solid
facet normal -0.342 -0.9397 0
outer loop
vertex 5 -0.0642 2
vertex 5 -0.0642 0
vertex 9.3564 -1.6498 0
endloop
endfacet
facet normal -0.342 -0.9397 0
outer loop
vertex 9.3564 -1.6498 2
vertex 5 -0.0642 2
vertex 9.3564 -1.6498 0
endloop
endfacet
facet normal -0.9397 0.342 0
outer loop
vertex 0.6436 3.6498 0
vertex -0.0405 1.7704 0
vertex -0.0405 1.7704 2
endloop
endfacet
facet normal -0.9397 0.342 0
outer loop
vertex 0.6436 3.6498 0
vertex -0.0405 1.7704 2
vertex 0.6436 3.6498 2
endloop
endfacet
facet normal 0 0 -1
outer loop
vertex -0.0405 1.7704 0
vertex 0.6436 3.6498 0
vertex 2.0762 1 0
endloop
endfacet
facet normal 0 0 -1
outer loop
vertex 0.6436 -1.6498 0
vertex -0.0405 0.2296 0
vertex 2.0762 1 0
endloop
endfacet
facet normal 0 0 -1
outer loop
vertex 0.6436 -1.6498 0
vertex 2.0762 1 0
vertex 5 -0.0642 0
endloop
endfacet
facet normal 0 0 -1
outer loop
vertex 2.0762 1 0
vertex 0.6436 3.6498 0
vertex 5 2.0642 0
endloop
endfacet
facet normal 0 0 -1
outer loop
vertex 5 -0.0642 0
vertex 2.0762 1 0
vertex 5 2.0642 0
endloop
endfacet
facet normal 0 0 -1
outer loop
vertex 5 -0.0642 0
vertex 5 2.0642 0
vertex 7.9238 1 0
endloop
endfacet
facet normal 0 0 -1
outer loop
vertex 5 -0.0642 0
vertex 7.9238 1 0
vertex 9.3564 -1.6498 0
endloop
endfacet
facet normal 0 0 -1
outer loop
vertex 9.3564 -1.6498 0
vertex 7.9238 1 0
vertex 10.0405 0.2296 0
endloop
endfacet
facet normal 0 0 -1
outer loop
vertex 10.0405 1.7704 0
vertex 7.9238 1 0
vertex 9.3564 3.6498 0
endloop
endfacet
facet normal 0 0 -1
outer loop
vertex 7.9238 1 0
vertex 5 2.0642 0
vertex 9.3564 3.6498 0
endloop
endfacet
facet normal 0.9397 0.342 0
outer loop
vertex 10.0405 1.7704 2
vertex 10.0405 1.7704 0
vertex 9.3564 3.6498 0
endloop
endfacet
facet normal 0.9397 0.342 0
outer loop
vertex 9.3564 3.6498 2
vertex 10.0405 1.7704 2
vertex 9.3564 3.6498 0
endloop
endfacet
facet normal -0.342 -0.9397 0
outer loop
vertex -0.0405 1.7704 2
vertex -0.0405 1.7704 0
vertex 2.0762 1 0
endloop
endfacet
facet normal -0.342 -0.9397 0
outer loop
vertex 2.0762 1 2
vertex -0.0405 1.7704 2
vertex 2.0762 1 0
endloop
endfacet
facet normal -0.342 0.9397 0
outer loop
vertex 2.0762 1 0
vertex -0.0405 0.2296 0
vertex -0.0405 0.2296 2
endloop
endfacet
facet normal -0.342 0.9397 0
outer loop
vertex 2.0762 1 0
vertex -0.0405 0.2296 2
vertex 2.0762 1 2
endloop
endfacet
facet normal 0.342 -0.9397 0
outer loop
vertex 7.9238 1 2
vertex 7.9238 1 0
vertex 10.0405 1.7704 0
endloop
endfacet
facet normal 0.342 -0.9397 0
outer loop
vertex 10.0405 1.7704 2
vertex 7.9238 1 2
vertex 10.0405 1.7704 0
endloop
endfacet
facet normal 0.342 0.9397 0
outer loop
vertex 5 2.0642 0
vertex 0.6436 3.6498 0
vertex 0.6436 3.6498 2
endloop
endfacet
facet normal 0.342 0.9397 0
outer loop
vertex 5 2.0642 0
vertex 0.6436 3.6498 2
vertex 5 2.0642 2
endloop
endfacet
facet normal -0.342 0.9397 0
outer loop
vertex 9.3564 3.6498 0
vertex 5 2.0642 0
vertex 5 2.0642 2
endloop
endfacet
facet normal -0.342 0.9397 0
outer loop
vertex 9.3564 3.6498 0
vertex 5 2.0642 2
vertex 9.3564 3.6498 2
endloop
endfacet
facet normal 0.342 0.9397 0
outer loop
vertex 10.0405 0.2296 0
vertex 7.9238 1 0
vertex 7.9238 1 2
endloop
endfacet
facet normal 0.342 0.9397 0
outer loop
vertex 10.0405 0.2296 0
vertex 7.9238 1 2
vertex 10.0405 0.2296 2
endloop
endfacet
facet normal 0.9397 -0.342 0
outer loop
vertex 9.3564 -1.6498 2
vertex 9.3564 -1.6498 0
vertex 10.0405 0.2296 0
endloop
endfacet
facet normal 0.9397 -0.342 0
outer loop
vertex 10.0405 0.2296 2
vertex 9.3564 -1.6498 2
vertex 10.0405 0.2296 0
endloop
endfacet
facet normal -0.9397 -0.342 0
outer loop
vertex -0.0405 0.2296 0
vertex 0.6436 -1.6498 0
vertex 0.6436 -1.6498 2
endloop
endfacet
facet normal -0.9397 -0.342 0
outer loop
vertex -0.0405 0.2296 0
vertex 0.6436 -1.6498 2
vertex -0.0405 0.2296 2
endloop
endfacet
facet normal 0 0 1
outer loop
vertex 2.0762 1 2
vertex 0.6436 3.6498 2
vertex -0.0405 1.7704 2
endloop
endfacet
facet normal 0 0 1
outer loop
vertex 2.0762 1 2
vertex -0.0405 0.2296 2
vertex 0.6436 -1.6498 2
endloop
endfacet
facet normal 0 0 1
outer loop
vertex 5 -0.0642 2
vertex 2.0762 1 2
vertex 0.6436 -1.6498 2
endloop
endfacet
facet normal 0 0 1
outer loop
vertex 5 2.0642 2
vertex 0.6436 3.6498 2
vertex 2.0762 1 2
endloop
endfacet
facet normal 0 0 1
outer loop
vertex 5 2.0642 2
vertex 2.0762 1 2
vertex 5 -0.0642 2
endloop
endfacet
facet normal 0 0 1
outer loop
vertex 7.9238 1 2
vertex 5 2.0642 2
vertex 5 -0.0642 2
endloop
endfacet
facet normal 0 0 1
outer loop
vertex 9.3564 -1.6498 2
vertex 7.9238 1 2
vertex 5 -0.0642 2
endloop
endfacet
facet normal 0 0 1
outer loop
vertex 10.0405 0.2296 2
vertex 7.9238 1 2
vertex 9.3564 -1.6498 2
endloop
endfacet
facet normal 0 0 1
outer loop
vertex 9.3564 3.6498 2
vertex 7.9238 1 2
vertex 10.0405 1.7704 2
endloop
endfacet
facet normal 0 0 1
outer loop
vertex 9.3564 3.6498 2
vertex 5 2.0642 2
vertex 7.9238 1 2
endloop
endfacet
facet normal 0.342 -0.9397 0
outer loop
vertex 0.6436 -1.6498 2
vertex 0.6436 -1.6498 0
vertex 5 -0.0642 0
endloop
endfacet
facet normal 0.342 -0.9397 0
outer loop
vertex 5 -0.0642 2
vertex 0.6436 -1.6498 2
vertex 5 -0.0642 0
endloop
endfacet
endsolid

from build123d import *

# Parameters (mm, degrees)
BOX001_W               = 10
BOX001_H               = 2
BOX001_DEPTH           = 2
BOX001_PLACEMENT_ANGLE = 340
BOX_W                  = 10
BOX_H                  = 2
BOX_DEPTH              = 2
BOX_PLACEMENT_ANGLE    = 20


with BuildPart() as cube001:
    # Box001 → Box001 (new body)
    with BuildSketch(Plane.XY):
        with Locations((5, 1)):
            Rectangle(BOX001_W, BOX001_H)
    extrude(amount=BOX001_DEPTH)


with BuildPart() as cube001_1:
    # Box001 placement: moved
    add(cube001.part.moved(Location((-0.040483, 1.770408, 0))).rotate(Axis((-0.040483, 1.770408, 0), (0, 0, 1)), BOX001_PLACEMENT_ANGLE))


with BuildPart() as fusion:
    # Box → Box (new body)
    with BuildSketch(Plane.XY):
        with Locations((5, 1)):
            Rectangle(BOX_W, BOX_H)
    extrude(amount=BOX_DEPTH)


with BuildPart() as fusion_1:
    # Box placement: moved
    add(fusion.part.moved(Location((0.643557, -1.649793, 0))).rotate(Axis((0.643557, -1.649793, 0), (0, 0, 1)), BOX_PLACEMENT_ANGLE))

    # Fusion: union Cube001
    add(cube001_1.part)


solid = fusion_1.part
